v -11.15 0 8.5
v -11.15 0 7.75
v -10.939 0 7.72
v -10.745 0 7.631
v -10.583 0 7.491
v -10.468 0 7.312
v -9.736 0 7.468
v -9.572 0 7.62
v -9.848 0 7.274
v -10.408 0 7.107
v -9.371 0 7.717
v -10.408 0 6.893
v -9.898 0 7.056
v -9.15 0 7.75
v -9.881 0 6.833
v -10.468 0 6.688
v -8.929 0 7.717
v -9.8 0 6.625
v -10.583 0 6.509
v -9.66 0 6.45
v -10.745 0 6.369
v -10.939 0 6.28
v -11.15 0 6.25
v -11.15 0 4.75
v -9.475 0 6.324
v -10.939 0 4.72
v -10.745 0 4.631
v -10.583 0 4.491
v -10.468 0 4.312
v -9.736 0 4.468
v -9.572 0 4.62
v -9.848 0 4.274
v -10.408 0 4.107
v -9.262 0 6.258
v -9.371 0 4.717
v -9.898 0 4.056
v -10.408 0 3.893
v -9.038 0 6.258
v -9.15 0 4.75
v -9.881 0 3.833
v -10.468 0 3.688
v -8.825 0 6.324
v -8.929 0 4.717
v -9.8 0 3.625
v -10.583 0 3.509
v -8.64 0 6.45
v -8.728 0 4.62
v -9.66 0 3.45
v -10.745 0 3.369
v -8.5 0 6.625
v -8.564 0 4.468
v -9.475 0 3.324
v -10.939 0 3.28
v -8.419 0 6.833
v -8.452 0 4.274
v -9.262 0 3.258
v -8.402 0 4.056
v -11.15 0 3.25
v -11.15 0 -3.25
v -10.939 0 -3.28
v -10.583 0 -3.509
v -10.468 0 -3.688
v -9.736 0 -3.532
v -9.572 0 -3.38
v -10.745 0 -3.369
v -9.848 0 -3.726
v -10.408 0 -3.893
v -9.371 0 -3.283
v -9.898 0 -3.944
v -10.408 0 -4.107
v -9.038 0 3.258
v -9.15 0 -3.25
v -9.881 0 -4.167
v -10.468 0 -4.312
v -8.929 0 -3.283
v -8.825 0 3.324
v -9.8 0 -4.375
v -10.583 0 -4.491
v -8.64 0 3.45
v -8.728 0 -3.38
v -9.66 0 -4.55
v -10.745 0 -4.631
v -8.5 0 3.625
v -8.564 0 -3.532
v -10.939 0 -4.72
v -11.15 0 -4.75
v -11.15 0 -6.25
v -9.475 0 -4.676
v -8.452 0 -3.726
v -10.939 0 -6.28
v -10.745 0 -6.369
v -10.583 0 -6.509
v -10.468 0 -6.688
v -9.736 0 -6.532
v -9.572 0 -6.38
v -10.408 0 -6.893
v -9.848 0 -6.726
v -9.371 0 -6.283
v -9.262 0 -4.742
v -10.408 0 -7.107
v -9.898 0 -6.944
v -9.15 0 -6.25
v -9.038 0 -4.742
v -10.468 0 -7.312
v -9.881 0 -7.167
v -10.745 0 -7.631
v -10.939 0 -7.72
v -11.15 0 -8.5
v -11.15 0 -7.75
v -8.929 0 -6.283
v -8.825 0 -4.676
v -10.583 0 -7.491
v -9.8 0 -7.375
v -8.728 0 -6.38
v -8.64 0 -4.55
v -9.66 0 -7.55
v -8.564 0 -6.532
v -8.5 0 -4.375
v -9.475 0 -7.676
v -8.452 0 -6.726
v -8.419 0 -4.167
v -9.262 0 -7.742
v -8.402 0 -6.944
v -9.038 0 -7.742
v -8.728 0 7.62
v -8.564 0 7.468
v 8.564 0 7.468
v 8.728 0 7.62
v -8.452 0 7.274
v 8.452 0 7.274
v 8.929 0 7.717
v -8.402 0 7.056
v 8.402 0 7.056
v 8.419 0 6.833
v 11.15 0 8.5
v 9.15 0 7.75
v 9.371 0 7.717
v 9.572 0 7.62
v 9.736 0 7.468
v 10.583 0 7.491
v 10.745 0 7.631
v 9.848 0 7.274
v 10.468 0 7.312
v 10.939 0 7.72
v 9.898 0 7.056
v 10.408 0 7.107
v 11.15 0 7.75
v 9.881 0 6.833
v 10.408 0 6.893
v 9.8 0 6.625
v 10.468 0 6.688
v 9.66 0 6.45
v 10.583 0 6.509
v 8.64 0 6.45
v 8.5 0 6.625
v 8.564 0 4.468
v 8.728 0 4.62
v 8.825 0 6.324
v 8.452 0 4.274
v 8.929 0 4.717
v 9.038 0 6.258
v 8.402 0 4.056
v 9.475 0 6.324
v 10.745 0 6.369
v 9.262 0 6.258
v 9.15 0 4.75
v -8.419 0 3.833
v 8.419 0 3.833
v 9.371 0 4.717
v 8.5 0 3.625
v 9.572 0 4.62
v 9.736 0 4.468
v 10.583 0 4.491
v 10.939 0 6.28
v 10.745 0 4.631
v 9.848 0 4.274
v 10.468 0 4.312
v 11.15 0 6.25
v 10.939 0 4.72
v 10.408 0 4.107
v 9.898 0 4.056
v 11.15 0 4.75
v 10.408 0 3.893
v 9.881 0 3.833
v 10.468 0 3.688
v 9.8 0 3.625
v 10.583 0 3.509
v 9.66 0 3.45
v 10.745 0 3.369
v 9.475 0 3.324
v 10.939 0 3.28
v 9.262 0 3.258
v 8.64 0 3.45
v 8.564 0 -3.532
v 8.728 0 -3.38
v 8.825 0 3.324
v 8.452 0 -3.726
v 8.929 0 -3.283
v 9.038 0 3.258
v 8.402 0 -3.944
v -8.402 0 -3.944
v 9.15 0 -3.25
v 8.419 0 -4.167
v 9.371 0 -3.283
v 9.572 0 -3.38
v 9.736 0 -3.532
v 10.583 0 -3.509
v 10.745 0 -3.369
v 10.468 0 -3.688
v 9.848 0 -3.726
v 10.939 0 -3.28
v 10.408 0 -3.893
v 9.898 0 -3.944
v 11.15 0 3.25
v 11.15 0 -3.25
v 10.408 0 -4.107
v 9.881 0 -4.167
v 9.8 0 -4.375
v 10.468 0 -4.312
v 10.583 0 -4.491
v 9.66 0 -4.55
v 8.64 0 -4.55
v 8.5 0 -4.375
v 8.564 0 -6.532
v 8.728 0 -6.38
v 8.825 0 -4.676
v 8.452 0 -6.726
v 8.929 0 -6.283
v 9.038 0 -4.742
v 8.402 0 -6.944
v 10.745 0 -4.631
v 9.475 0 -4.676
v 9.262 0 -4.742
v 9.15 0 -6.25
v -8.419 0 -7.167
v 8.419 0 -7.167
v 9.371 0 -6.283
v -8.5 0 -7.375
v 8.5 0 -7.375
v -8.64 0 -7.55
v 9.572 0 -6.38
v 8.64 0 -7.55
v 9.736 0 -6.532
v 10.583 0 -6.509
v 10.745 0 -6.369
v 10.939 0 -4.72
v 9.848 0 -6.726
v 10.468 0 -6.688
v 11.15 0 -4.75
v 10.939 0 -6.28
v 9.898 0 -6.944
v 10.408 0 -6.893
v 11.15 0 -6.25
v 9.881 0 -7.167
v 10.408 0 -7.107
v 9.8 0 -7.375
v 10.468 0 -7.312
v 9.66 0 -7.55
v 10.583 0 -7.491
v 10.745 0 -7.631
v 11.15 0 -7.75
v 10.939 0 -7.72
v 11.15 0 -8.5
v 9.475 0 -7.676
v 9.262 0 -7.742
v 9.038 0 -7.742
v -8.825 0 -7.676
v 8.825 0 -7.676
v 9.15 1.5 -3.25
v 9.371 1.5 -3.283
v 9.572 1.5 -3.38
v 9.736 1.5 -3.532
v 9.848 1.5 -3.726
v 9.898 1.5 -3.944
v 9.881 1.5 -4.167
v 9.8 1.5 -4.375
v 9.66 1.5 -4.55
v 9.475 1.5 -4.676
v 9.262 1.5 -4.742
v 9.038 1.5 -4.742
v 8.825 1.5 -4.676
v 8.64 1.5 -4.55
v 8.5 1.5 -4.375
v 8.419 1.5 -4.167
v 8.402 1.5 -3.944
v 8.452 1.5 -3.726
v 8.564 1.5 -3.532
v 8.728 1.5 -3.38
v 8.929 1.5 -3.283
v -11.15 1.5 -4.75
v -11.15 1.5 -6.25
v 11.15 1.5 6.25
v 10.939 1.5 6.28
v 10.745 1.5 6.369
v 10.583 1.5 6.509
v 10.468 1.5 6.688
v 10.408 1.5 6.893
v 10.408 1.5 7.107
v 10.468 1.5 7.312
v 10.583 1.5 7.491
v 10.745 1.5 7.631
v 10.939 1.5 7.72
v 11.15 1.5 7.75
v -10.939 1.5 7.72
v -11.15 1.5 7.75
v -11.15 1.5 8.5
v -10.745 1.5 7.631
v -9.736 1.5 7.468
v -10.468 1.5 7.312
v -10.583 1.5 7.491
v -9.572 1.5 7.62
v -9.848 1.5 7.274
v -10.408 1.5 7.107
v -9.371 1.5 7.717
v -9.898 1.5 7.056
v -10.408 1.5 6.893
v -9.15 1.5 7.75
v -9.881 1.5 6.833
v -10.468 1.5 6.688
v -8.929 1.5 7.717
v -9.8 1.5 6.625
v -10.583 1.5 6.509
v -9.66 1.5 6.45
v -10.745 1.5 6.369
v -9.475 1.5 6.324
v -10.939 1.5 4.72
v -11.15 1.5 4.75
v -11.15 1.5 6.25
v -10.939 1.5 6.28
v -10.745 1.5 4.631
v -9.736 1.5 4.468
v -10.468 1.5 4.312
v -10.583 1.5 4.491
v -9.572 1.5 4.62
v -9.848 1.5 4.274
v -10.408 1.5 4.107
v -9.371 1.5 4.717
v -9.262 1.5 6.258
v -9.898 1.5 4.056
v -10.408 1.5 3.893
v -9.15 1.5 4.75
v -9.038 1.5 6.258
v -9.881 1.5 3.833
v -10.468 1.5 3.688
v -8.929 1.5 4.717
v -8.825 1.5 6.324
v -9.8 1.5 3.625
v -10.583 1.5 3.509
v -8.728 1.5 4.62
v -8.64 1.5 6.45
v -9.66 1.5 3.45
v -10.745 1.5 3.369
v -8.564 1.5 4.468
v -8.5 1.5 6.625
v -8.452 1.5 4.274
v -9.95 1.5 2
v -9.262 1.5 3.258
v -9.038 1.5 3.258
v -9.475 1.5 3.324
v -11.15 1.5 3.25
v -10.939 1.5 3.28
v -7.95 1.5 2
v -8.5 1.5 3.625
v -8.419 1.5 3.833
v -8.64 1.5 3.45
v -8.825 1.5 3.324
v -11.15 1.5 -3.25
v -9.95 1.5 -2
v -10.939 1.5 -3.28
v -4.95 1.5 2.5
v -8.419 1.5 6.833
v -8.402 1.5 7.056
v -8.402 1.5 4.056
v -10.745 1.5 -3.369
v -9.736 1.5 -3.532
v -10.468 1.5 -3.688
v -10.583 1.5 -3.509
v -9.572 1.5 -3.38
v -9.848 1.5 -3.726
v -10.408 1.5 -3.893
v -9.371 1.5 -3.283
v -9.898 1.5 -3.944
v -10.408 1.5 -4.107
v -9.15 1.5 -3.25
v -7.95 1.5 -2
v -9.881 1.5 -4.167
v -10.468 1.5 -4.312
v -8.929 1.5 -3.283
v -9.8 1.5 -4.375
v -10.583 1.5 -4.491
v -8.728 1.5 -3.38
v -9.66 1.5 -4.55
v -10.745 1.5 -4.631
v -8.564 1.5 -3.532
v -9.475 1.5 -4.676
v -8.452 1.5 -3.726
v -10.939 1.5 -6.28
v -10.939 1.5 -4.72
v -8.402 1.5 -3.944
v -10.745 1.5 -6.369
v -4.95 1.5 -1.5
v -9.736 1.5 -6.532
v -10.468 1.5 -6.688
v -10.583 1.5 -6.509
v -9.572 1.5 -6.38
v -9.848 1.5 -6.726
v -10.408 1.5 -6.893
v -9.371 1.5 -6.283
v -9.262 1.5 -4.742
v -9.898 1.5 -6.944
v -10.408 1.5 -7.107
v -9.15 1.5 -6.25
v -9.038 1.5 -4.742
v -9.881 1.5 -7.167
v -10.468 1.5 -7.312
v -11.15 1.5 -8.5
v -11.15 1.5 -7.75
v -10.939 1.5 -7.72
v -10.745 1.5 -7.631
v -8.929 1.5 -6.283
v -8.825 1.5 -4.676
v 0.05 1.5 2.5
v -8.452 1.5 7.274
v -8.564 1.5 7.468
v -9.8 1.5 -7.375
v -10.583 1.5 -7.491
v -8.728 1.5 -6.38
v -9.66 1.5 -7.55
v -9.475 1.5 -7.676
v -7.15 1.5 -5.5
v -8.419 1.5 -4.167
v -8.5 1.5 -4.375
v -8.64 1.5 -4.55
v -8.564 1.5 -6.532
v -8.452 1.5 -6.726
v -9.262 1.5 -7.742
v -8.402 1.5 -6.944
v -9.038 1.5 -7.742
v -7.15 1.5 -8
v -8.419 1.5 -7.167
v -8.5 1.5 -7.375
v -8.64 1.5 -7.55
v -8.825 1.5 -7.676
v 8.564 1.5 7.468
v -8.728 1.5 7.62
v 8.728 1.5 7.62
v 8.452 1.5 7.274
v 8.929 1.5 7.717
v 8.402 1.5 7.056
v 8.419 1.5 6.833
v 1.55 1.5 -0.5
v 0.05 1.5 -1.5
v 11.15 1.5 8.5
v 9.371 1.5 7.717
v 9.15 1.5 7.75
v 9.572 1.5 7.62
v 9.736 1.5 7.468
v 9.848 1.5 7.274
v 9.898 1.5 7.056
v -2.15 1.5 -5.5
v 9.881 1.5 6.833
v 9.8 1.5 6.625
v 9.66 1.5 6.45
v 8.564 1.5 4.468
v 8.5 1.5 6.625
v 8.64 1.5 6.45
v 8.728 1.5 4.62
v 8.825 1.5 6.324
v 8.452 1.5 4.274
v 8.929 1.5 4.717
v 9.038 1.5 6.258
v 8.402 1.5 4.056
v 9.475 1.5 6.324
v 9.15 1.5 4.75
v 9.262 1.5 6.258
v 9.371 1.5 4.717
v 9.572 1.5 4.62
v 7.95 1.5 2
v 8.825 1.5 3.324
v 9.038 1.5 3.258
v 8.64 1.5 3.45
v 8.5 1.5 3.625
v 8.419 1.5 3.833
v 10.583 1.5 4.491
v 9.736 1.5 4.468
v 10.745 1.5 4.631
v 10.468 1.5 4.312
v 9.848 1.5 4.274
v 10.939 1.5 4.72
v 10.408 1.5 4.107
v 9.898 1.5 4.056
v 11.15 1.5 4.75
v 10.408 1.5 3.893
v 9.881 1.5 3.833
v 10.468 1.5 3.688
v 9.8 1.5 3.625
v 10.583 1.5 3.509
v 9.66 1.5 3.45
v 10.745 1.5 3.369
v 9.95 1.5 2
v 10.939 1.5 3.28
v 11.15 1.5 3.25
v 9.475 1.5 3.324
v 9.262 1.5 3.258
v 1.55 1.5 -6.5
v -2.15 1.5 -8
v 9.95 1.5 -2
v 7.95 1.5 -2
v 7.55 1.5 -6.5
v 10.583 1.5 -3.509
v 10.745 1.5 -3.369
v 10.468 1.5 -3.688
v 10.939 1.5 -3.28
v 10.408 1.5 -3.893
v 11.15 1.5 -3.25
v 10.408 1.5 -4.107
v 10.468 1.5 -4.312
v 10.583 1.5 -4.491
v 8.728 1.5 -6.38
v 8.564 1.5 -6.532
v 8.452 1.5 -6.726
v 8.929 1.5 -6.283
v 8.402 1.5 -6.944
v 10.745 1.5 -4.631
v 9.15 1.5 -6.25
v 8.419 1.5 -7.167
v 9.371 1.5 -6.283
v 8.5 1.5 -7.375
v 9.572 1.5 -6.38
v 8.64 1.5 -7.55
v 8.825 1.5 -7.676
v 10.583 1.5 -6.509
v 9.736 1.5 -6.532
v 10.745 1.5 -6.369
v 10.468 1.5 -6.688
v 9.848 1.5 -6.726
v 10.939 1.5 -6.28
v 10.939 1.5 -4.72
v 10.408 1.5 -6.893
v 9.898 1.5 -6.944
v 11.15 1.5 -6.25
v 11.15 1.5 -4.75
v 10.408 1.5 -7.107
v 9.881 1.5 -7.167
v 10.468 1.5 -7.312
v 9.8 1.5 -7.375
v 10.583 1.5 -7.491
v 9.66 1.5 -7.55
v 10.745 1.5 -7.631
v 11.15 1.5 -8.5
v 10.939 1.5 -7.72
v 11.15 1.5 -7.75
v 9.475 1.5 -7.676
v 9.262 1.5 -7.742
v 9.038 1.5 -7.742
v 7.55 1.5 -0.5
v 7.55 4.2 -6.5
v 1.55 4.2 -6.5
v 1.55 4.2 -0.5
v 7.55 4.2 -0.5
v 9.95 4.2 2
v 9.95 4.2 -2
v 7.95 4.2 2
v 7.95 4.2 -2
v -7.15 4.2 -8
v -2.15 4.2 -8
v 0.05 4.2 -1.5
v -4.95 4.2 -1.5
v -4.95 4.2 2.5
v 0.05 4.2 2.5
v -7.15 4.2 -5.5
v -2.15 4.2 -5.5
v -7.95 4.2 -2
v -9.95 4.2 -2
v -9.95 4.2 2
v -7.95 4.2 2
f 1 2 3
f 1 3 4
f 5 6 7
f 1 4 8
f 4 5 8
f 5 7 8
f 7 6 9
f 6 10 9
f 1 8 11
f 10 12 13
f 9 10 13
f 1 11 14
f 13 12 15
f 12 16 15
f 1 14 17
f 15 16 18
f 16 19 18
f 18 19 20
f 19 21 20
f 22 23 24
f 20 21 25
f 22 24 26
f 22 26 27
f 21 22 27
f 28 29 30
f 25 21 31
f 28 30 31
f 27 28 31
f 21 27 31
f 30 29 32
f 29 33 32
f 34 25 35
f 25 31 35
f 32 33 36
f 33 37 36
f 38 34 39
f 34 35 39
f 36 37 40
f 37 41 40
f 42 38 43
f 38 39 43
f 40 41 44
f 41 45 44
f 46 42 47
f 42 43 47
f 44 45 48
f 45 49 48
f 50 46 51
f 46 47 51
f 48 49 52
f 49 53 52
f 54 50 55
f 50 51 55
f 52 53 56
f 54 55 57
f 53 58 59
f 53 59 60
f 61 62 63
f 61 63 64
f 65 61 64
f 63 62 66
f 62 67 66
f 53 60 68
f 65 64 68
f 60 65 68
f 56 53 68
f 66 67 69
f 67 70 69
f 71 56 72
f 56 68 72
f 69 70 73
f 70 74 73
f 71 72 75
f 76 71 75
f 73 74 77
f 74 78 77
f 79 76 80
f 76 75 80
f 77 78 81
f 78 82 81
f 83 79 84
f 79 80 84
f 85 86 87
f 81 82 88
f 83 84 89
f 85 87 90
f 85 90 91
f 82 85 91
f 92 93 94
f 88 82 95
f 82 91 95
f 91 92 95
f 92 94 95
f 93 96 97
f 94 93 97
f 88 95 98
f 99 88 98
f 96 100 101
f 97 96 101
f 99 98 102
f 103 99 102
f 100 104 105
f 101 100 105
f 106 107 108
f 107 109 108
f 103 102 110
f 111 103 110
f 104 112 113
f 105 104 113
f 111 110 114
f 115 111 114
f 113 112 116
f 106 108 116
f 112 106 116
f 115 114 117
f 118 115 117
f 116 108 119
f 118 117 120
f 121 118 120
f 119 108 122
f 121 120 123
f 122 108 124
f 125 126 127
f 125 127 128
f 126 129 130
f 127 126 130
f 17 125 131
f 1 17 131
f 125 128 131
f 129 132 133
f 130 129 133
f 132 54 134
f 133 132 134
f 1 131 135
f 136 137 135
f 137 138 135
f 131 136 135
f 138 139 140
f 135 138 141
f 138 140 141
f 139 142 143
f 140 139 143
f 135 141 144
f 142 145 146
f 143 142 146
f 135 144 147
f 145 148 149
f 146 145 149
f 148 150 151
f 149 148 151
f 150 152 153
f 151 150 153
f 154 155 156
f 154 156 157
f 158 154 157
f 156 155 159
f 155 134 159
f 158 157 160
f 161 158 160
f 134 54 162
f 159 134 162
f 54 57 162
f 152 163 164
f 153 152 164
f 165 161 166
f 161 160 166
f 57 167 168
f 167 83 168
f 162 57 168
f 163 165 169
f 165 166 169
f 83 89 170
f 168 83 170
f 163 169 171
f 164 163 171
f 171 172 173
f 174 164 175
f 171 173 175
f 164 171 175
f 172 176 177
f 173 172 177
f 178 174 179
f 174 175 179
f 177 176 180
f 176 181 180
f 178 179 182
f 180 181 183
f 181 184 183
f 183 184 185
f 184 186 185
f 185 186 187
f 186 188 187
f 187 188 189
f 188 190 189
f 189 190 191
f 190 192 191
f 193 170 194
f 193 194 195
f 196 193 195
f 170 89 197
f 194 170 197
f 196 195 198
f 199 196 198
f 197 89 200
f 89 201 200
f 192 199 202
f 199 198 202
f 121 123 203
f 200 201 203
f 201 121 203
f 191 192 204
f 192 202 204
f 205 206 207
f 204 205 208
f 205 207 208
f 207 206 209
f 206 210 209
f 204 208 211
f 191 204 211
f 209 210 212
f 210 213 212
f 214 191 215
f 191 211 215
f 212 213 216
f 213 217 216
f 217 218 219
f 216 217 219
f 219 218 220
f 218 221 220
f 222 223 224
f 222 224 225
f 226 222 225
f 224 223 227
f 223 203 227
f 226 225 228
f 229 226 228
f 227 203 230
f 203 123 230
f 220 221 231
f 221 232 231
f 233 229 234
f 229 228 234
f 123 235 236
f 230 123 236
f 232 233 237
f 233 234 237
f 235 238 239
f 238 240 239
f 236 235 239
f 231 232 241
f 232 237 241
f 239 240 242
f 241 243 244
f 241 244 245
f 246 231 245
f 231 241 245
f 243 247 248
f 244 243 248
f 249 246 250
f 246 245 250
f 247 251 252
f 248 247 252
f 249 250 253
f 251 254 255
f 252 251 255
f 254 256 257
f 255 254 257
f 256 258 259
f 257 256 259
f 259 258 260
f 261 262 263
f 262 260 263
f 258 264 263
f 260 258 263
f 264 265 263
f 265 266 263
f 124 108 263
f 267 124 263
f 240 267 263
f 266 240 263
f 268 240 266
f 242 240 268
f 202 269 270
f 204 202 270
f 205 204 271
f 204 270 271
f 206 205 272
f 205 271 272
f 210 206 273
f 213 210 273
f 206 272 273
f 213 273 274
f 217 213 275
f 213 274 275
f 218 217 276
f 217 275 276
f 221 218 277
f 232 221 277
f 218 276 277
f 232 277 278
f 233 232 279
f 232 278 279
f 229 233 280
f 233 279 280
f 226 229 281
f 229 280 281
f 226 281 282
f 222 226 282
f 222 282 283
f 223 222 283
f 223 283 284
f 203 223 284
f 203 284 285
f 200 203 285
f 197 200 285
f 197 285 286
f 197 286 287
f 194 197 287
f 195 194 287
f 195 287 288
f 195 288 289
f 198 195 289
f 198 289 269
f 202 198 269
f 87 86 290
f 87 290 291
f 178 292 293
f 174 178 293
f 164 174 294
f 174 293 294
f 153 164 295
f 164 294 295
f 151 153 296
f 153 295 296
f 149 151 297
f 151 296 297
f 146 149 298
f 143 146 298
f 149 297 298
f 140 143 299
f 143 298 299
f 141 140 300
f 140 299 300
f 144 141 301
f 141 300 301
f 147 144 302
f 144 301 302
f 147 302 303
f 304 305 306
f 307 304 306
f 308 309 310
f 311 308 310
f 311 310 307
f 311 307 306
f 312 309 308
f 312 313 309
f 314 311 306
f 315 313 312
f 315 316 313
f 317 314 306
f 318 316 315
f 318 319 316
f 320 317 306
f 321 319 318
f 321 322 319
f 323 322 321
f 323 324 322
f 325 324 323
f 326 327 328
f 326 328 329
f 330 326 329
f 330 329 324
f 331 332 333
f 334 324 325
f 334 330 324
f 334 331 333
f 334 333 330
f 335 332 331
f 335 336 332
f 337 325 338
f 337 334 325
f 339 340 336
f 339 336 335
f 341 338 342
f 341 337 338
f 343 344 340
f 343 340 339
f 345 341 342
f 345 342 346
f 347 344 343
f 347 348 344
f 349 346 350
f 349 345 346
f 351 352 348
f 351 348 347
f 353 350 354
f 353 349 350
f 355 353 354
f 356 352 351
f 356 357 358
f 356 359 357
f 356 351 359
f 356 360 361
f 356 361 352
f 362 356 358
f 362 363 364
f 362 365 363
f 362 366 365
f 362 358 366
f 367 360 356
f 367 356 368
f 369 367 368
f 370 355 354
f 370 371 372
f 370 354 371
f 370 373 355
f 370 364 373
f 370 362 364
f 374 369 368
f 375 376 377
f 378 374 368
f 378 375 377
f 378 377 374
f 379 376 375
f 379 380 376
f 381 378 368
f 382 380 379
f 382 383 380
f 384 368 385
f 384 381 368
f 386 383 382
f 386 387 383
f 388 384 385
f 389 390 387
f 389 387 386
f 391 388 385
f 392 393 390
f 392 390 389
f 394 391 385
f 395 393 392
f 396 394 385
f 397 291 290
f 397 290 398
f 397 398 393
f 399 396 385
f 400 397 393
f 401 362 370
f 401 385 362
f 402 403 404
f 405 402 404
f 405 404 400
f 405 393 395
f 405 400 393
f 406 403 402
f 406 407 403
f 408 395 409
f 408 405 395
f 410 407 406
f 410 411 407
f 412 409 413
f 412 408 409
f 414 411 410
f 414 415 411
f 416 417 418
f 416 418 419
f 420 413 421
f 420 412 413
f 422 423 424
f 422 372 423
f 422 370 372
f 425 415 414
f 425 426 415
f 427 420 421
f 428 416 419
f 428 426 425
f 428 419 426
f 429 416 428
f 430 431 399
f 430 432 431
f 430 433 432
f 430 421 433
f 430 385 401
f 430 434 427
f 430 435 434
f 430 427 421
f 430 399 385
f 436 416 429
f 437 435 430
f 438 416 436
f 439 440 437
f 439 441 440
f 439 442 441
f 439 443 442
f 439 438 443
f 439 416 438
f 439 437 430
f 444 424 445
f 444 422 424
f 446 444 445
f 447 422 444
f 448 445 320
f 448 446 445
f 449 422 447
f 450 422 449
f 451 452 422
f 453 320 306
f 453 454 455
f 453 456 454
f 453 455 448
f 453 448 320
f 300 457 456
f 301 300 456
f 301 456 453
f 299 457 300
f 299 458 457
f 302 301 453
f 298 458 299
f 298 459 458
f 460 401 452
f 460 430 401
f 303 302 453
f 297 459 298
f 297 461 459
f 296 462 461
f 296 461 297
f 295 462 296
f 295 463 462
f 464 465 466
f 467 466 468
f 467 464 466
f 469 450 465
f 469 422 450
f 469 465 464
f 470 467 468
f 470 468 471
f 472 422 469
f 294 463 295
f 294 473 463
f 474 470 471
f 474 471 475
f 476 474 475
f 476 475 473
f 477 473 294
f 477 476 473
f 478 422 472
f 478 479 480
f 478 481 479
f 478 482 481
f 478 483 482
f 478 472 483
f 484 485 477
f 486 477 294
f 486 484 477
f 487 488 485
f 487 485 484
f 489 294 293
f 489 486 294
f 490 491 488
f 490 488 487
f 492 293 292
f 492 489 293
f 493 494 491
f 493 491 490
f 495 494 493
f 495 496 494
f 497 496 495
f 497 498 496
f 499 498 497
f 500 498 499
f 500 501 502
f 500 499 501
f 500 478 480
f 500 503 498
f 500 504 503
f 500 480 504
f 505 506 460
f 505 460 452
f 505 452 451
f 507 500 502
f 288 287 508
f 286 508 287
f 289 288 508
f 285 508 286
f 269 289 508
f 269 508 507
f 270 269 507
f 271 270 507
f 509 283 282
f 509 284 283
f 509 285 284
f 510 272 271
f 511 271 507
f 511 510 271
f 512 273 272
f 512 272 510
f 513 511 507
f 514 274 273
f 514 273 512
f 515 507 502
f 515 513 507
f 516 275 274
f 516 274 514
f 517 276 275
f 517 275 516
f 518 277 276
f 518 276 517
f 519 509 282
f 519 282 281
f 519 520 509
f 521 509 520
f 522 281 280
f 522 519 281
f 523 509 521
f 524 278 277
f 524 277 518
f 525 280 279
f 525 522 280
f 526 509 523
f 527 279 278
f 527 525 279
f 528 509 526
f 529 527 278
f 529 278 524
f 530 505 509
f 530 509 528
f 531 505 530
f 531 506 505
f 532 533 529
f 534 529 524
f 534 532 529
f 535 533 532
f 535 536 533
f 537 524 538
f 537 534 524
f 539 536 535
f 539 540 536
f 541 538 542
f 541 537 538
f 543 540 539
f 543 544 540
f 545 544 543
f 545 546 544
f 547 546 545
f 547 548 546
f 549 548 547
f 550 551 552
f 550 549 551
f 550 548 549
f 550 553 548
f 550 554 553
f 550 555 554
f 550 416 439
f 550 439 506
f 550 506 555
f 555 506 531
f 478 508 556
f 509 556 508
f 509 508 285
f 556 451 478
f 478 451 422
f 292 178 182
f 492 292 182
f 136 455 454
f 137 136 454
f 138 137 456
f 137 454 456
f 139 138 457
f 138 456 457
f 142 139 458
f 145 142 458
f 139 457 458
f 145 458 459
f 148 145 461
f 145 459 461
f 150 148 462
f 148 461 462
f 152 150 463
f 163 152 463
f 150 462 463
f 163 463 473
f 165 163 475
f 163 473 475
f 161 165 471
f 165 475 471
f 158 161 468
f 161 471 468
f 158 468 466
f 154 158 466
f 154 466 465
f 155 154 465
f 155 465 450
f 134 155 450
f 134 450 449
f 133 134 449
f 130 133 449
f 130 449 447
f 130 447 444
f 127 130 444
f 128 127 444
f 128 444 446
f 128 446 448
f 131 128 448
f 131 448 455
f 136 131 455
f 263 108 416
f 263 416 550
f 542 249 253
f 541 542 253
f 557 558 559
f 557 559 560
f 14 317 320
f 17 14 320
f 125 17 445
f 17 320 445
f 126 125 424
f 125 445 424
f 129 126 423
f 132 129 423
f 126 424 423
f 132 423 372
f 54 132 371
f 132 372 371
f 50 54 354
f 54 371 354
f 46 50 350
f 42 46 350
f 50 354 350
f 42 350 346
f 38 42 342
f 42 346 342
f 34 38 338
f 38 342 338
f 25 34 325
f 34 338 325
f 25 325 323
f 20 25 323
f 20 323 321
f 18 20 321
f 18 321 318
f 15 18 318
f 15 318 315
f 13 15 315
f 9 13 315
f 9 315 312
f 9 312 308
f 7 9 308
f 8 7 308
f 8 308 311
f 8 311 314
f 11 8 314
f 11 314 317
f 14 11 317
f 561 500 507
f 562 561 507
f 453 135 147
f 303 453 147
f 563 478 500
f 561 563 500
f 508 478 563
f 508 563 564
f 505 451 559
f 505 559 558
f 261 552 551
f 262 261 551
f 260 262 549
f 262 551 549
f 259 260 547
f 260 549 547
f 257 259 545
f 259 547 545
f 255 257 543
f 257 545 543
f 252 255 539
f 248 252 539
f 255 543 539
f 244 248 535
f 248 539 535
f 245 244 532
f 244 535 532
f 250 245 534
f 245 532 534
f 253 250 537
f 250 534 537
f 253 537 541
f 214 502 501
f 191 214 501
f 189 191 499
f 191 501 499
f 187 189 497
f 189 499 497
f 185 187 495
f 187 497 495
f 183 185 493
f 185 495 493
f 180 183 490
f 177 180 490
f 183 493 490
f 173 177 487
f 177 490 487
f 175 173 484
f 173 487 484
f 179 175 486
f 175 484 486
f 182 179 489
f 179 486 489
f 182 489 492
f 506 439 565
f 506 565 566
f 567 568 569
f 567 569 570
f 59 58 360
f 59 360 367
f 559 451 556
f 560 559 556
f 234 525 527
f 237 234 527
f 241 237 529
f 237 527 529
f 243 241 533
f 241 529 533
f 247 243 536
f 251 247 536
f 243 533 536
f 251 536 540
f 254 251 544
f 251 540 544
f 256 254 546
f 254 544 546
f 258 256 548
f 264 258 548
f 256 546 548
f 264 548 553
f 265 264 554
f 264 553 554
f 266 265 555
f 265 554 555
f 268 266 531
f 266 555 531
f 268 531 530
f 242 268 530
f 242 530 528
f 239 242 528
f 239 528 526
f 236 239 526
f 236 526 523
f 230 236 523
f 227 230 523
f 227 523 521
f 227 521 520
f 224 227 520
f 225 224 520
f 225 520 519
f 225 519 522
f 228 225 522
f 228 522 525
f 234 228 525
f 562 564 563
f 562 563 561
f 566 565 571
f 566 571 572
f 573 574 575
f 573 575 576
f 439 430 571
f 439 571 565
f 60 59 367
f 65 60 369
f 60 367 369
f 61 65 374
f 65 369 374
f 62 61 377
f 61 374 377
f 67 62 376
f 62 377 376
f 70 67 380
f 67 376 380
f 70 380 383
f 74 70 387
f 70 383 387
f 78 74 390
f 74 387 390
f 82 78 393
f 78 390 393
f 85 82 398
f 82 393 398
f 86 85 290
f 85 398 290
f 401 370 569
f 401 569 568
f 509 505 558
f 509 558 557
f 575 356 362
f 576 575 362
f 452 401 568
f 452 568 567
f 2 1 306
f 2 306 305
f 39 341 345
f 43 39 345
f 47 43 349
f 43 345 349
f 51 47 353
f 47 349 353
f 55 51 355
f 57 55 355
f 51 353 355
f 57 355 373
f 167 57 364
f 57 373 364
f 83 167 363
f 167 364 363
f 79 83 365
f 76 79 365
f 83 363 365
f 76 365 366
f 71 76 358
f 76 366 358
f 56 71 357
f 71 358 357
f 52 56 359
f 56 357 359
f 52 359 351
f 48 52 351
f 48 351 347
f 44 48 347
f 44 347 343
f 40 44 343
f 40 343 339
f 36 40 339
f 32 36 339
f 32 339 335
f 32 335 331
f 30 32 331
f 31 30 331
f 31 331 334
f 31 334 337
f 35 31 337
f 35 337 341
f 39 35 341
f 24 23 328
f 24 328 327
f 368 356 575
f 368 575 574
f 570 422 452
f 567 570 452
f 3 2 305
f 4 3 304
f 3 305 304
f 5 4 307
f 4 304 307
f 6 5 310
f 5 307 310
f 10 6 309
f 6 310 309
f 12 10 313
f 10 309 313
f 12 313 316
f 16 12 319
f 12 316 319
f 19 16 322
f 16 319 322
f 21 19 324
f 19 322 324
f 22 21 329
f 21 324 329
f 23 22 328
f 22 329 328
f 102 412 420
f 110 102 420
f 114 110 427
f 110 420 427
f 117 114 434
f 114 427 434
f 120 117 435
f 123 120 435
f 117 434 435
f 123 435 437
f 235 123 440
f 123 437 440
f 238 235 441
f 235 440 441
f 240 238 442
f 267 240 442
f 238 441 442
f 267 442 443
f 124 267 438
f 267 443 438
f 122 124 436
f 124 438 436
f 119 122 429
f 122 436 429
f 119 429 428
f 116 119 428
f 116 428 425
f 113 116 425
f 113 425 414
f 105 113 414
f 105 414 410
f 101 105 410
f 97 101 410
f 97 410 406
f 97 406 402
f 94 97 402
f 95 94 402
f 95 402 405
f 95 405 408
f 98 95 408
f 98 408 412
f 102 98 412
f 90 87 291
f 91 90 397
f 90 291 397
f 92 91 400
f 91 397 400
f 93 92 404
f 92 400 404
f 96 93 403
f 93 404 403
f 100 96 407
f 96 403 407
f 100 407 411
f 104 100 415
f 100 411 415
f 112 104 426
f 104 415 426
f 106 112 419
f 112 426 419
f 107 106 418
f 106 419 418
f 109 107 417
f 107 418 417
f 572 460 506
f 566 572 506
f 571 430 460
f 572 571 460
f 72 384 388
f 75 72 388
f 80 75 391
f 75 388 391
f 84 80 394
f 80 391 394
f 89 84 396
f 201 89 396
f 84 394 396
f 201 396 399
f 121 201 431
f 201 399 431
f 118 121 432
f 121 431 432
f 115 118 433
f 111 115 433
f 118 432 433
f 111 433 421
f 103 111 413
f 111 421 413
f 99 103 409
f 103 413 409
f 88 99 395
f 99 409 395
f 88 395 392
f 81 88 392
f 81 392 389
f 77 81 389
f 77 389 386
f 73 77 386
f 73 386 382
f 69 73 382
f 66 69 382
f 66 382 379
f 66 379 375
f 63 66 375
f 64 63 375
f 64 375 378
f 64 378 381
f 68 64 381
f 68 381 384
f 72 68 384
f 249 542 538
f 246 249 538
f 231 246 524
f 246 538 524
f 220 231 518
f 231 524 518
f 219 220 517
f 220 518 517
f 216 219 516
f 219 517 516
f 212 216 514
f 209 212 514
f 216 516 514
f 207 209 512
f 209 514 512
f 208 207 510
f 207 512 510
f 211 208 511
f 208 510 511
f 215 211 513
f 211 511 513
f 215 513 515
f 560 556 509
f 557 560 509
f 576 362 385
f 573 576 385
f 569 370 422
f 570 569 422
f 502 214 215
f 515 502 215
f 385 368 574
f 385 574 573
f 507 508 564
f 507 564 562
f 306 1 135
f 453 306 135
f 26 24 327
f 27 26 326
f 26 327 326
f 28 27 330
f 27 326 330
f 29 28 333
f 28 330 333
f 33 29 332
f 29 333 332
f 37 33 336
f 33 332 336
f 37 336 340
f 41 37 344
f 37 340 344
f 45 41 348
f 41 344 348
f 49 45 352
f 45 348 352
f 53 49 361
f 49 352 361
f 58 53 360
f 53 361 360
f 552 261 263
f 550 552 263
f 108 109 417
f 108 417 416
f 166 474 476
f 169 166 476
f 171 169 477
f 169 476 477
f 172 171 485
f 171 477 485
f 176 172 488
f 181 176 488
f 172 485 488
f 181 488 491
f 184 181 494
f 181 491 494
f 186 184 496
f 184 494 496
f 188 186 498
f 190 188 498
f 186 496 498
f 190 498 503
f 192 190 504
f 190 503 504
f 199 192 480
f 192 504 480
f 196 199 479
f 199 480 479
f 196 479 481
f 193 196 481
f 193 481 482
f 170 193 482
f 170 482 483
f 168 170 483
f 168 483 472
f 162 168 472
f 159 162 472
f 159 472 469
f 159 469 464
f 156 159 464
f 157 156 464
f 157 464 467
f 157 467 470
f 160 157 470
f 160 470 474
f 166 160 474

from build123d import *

# Parameters (mm, degrees)
SKETCH_1_W          = 22.3
SKETCH_1_H          = 17
EXTRUDE_1_DEPTH     = 1.5
SKETCH_2_W          = 6
SKETCH_2_H          = 6
SKETCH_2_W_2        = 5
SKETCH_2_H_2        = 2.5
SKETCH_2_W_3        = 2
SKETCH_2_H_3        = 4
EXTRUDE_2_DEPTH     = 2.7
SKETCH_3_R          = 0.75
CUT_EXTRUDE_1_DEPTH = 15.278042583


with BuildPart() as part:
    # 스케치1 → 보스-돌출1 (new body)
    with BuildSketch(Plane(origin=(0, 0, 0), x_dir=(1, 0, 0), z_dir=(0, 1, 0))):
        Rectangle(SKETCH_1_W, SKETCH_1_H)
    extrude(amount=EXTRUDE_1_DEPTH)

    # 스케치2 → 보스-돌출2 (add)
    with BuildSketch(Plane(origin=(0, 1.5, 0), x_dir=(1, 0, 0), z_dir=(0, 1, 0))):
        with Locations((4.55, 3.5)):
            Rectangle(SKETCH_2_W, SKETCH_2_H)
        with Locations((-4.65, 6.75)):
            Rectangle(SKETCH_2_W_2, SKETCH_2_H_2)
        with Locations((-8.95, 0)):
            Rectangle(SKETCH_2_W_3, SKETCH_2_H_3)
        with Locations((8.95, 0)):
            Rectangle(SKETCH_2_W_3, SKETCH_2_H_3)
        with Locations((-2.45, -0.5)):
            Rectangle(SKETCH_2_W_2, SKETCH_2_H_3)
    extrude(amount=EXTRUDE_2_DEPTH)

    # 스케치3 → 컷-돌출1 (cut, through all)
    with BuildSketch(Plane(origin=(0, 1.5, 0), x_dir=(1, 0, 0), z_dir=(0, 1, 0))):
        with Locations((-11.15, 7)):
            Circle(SKETCH_3_R)
        with Locations((-11.15, 4)):
            Circle(SKETCH_3_R)
        with Locations(Location((-9.15, 7, 0), (0, 0, 270))):
            Circle(SKETCH_3_R)
        with Locations(Location((-9.15, 4, 0), (0, 0, 270))):
            Circle(SKETCH_3_R)
        with Locations(Location((9.15, 7, 0), (0, 0, 270))):
            Circle(SKETCH_3_R)
        with Locations((11.15, 7)):
            Circle(SKETCH_3_R)
        with Locations(Location((9.15, 4, 0), (0, 0, 270))):
            Circle(SKETCH_3_R)
        with Locations((11.15, 4)):
            Circle(SKETCH_3_R)
        with Locations((-11.15, -4)):
            Circle(SKETCH_3_R)
        with Locations(Location((-9.15, -4, 0), (0, 0, 270))):
            Circle(SKETCH_3_R)
        with Locations(Location((-9.15, -7, 0), (0, 0, 270))):
            Circle(SKETCH_3_R)
        with Locations((-11.15, -7)):
            Circle(SKETCH_3_R)
        with Locations((11.15, -4)):
            Circle(SKETCH_3_R)
        with Locations(Location((9.15, -4, 0), (0, 0, 270))):
            Circle(SKETCH_3_R)
        with Locations(Location((9.15, -7, 0), (0, 0, 270))):
            Circle(SKETCH_3_R)
        with Locations((11.15, -7)):
            Circle(SKETCH_3_R)
    extrude(amount=-CUT_EXTRUDE_1_DEPTH, mode=Mode.SUBTRACT)


solid = part.part
